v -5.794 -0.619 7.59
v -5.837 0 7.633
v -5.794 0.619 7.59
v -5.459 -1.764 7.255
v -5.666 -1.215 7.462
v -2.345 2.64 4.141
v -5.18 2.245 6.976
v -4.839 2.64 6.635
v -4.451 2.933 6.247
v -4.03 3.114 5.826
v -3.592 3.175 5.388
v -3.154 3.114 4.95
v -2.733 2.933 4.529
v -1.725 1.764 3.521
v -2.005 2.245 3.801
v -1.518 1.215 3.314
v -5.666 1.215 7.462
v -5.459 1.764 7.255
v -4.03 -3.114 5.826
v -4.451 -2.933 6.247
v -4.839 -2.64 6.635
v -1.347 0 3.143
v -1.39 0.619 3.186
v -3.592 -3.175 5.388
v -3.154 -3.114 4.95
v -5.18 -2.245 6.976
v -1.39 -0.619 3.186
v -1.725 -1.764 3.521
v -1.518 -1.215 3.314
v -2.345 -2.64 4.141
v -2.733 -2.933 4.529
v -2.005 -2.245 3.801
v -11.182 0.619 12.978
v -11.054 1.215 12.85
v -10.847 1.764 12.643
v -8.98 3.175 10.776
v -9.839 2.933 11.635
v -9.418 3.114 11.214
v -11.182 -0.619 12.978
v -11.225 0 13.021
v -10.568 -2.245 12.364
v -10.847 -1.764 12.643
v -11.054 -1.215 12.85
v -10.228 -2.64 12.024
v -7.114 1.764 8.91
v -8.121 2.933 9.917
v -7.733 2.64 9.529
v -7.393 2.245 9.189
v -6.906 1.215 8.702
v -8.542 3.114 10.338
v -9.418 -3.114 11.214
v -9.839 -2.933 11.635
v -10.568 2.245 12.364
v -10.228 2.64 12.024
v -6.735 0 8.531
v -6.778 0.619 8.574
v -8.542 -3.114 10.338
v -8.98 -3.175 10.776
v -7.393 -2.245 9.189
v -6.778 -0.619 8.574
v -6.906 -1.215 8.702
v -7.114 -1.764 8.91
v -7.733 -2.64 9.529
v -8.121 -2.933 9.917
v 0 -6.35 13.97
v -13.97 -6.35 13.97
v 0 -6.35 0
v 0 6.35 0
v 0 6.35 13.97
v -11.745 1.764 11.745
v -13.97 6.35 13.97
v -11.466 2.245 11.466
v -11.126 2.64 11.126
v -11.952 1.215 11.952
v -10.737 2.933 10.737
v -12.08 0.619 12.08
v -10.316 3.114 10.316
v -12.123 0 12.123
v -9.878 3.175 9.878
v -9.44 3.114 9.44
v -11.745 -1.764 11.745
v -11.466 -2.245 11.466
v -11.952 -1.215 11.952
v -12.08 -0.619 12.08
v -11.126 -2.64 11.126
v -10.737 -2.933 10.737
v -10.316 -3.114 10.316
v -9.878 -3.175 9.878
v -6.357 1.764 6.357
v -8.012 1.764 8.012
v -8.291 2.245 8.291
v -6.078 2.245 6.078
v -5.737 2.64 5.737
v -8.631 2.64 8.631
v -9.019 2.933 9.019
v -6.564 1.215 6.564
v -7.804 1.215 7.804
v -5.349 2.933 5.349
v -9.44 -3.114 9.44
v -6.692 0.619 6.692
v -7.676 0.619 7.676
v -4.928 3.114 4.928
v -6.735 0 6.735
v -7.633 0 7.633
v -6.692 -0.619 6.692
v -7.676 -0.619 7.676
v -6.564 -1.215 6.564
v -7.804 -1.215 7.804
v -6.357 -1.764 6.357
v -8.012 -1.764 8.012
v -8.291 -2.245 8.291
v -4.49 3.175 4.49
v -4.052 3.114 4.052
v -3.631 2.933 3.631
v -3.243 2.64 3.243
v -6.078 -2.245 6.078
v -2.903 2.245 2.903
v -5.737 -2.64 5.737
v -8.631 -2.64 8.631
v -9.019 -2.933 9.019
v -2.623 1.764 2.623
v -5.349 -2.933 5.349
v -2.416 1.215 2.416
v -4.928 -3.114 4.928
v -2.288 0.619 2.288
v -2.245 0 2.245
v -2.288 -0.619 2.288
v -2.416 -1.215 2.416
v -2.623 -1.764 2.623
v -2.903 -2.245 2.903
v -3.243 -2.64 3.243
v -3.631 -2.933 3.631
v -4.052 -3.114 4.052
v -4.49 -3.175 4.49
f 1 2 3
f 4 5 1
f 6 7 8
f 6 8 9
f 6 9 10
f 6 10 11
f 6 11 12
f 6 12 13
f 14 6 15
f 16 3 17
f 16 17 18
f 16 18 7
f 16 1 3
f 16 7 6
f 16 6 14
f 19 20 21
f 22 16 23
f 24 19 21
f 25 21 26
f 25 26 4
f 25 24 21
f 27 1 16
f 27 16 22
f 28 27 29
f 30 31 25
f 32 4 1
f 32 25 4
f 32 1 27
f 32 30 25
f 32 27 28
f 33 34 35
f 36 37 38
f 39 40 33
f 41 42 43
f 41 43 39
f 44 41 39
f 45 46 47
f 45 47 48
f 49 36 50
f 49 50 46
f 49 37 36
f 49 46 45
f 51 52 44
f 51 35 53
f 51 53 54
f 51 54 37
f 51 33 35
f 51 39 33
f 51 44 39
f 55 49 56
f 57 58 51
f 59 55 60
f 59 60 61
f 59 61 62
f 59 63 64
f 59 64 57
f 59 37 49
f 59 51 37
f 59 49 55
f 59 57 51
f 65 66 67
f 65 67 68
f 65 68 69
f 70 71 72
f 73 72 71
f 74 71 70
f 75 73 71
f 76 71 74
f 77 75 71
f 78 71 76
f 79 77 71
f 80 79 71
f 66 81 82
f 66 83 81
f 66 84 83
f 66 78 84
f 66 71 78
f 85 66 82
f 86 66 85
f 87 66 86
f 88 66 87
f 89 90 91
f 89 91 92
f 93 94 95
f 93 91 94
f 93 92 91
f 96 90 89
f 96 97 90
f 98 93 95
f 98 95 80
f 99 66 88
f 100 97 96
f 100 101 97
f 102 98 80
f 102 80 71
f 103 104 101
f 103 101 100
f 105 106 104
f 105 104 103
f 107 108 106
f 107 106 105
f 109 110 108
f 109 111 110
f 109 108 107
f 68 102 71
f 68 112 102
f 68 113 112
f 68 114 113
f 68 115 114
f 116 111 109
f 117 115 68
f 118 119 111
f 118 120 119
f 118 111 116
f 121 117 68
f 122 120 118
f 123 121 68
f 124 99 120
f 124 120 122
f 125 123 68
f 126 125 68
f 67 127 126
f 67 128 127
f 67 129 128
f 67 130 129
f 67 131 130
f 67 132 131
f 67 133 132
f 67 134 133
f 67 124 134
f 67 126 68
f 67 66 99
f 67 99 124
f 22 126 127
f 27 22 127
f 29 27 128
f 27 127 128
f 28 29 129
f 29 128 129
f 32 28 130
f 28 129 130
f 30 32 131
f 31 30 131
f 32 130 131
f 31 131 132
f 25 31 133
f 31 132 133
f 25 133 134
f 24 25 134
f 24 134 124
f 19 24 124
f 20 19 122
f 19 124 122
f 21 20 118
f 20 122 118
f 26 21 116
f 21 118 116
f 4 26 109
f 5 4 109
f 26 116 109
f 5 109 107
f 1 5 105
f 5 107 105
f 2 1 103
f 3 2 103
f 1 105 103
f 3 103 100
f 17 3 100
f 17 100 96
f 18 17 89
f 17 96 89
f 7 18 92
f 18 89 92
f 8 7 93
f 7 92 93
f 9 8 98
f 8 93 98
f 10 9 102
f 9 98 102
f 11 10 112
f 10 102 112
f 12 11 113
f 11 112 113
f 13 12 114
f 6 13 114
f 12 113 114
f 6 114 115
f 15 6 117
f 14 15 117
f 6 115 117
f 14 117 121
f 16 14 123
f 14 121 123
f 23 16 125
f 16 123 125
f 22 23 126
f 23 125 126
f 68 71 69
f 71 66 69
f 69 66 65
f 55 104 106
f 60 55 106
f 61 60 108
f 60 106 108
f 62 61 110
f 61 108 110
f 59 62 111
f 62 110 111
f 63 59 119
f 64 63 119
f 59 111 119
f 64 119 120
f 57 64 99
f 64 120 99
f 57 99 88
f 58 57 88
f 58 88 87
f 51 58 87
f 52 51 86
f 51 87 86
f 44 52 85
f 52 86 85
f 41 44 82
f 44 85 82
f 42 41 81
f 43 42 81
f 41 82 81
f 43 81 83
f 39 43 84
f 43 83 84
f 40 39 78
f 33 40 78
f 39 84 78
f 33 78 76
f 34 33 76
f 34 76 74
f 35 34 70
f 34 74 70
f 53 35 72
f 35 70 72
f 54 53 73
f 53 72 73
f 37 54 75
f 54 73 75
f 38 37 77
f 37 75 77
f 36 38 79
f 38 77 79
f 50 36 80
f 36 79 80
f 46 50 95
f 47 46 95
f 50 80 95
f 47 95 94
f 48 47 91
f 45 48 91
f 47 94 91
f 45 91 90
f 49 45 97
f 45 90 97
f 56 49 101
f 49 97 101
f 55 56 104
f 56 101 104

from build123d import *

# Parameters (mm, degrees)
F1_DEPTH = 6.35
F2_R     = 3.175
F3_DEPTH = 1.27
F5_DEPTH = 12.7


with BuildPart() as f1:
    # F0 (on Front) → F1 (new body, symmetric)
    with BuildSketch(Plane.XZ):
        Polygon((-25.4, 25.4), (0, 0), (0, 25.4), align=None)
    extrude(amount=F1_DEPTH, both=True)

    # F2 (on face) → F3 (cut)
    with BuildSketch(Plane(origin=(0, 0, 0), x_dir=(0.7071067812, 0, -0.7071067812), z_dir=(-0.7071067812, 0, -0.7071067812))):
        with Locations((-13.97, 0)):
            Circle(F2_R)
        with Locations((-6.35, 0)):
            Circle(F2_R)
    extrude(amount=-F3_DEPTH, mode=Mode.SUBTRACT)

    # F4 (on face) → F5 (cut)
    with BuildSketch(Plane.XZ.offset(6.35)):
        Polygon((-25.4, 25.4), (-13.97, 13.97), (0, 13.97), (0, 25.4), align=None)
    extrude(amount=-F5_DEPTH, mode=Mode.SUBTRACT)


solid = f1.part
